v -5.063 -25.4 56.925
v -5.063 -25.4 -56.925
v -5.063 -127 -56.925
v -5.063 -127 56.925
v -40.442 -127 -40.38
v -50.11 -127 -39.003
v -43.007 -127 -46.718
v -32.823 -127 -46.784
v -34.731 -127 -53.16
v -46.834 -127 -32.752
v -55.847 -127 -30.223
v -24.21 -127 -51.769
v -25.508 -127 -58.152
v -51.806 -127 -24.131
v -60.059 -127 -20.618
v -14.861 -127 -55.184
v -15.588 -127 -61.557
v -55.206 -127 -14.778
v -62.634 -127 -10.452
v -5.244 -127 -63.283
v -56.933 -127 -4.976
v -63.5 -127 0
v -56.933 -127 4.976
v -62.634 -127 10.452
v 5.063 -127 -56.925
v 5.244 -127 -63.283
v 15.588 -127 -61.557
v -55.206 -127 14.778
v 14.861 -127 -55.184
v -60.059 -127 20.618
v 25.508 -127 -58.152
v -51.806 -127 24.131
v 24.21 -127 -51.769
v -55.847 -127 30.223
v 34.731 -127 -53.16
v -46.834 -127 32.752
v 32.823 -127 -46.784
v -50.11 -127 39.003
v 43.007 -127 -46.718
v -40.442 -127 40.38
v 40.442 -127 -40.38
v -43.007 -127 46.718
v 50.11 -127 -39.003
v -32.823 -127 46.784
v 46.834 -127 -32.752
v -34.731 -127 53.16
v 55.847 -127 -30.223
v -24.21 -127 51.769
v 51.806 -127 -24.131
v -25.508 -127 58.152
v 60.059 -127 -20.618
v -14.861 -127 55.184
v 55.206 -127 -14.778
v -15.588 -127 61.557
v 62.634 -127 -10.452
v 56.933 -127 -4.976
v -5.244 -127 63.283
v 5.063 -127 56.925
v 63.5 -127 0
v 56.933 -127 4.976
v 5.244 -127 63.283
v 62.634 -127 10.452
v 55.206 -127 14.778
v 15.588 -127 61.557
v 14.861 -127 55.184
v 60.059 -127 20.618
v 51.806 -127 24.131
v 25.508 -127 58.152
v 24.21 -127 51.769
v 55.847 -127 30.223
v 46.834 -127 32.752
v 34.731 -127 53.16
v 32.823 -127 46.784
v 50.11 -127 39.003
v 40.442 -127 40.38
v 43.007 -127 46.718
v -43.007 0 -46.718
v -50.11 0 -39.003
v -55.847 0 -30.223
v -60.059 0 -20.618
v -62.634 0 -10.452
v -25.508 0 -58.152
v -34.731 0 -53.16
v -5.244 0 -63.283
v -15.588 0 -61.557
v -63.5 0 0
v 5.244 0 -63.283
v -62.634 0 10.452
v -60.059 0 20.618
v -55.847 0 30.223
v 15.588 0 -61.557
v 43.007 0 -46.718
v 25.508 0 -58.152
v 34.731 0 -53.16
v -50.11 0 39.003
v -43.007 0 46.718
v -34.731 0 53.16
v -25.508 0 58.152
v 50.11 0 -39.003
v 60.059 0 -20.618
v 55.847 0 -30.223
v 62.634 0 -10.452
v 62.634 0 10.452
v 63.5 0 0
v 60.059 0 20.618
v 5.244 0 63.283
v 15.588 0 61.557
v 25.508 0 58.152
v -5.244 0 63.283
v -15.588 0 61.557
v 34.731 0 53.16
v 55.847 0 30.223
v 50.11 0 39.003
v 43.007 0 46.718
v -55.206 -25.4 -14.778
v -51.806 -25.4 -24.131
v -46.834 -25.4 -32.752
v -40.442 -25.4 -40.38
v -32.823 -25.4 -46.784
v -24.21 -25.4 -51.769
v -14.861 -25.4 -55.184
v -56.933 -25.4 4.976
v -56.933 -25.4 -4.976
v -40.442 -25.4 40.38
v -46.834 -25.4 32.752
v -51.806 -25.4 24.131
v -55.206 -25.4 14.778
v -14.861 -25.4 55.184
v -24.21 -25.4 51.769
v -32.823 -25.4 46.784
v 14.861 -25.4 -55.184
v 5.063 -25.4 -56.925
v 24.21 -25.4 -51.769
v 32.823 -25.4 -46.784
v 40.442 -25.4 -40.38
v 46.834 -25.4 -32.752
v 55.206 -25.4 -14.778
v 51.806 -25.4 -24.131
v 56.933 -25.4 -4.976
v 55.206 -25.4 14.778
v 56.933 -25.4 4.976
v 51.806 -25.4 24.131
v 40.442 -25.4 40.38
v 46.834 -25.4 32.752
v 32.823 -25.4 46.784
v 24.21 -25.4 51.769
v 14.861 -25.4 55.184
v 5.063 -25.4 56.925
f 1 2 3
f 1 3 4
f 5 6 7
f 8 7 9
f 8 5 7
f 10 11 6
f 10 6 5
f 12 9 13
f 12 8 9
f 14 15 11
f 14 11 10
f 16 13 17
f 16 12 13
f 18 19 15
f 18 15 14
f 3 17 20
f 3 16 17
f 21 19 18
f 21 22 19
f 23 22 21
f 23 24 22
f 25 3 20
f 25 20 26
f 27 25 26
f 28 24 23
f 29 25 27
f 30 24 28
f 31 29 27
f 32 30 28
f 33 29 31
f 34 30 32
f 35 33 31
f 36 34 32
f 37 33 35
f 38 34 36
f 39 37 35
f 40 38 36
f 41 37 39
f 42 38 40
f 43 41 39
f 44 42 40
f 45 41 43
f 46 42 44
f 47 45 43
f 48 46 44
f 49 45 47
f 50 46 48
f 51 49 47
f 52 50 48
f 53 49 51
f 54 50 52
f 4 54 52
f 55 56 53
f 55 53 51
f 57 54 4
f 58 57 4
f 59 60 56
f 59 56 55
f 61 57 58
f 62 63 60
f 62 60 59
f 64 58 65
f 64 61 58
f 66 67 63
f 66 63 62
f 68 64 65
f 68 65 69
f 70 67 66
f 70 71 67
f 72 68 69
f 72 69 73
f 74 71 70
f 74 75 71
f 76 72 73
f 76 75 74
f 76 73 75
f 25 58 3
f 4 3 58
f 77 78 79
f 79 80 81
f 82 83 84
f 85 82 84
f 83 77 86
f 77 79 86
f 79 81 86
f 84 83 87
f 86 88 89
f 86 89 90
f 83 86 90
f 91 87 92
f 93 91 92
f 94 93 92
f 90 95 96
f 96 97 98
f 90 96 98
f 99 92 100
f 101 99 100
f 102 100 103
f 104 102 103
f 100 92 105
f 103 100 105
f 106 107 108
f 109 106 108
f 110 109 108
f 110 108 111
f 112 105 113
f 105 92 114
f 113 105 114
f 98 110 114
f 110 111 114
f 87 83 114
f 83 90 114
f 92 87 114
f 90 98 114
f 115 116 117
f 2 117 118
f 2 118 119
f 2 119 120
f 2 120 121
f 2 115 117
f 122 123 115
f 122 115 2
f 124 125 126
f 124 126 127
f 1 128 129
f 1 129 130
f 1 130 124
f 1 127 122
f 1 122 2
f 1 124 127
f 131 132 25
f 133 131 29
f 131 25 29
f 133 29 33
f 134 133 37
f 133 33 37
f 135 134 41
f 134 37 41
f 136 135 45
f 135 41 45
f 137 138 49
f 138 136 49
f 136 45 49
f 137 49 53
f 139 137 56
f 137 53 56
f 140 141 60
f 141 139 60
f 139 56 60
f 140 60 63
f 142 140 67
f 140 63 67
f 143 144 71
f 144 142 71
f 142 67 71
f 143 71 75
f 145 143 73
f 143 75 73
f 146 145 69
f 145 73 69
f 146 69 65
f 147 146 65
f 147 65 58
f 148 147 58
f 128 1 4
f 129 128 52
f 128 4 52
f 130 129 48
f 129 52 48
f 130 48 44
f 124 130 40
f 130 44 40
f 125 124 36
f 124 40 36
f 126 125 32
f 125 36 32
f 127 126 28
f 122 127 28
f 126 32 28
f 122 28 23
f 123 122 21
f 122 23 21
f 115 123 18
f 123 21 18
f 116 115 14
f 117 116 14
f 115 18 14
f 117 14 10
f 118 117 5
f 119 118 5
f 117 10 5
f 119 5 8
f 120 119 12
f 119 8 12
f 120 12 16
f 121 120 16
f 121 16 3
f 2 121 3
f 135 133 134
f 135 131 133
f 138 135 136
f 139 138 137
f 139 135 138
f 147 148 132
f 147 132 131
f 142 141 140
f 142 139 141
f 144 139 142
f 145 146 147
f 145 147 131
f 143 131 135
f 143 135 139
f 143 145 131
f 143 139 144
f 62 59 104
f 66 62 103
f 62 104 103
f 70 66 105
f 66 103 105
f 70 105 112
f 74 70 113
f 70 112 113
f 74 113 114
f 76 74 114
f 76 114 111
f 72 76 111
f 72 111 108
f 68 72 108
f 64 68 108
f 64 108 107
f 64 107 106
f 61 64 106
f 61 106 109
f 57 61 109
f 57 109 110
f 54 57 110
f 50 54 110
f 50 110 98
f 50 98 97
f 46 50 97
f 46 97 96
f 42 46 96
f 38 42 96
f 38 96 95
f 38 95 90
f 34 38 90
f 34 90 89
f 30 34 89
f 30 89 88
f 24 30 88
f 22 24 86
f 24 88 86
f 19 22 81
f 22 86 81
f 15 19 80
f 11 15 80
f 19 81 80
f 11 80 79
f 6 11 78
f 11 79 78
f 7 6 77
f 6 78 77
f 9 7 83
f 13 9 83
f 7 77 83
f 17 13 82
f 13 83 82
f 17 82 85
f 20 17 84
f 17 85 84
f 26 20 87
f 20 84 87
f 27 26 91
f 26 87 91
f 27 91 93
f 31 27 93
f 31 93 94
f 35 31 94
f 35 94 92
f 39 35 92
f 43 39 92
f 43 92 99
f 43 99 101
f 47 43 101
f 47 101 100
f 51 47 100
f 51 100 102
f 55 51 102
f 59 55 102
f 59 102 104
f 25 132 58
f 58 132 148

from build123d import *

# Parameters (mm, degrees)
F0_R     = 63.5
F1_DEPTH = 127
F4_D     = 114.3
F5_DEPTH = 25.4
F6_W     = 10.1255085319
F6_H     = 120.7859069109
F7_DEPTH = 101.6


# Not quite as in the source:
# - a feature names something its author has since deleted; it is built from what else it names


with BuildPart() as f1:
    # F0 (on Front) → F1 (new body)
    with BuildSketch(Plane.XZ):
        Circle(F0_R)
    extrude(amount=F1_DEPTH)

    # F4 (through all)
    with Locations(Plane(origin=(0, 0, 0), x_dir=(-1, 0, 0), z_dir=(0, 1, 0))):
        with Locations((0, 0)):
            Hole(F4_D / 2)

    # F0 (on Front) → F5 (join)
    with BuildSketch(Plane.XZ):
        Circle(F0_R)
    extrude(amount=F5_DEPTH)

    # F6 (on face) → F7 (join)
    with BuildSketch(Plane.XZ.offset(25.4)):
        Rectangle(F6_W, F6_H)
    extrude(amount=F7_DEPTH)


solid = f1.part
